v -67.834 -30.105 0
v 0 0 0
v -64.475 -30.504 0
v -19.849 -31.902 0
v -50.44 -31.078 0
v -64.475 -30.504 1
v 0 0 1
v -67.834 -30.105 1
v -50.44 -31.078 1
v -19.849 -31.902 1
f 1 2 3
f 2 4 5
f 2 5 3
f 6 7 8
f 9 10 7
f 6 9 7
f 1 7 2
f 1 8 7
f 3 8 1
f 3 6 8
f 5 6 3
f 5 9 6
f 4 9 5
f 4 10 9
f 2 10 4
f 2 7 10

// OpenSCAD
// Generated by SolidPython 1.1.3 on 2024-05-19 23:35:49


linear_extrude(height = 1) {
	polygon(points = [[0, 0], [-67.8343250000, -30.1046843750], [-67.7801375000, -30.1111265625], [-67.7259500000, -30.1175687500], [-67.6717625000, -30.1240109375], [-67.6175750000, -30.1304531250], [-67.5633875000, -30.1368953125], [-67.5092000000, -30.1433375000], [-67.4550125000, -30.1497796875], [-67.4008250000, -30.1562218750], [-67.3466375000, -30.1626640625], [-67.2924500000, -30.1691062500], [-67.2382625000, -30.1755484375], [-67.1840750000, -30.1819906250], [-67.1298875000, -30.1884328125], [-67.0757000000, -30.1948750000], [-67.0215125000, -30.2013171875], [-66.9673250000, -30.2077593750], [-66.9131375000, -30.2142015625], [-66.8589500000, -30.2206437500], [-66.8047625000, -30.2270859375], [-66.7505750000, -30.2335281250], [-66.6963875000, -30.2399703125], [-66.6422000000, -30.2464125000], [-66.5880125000, -30.2528546875], [-66.5338250000, -30.2592968750], [-66.4796375000, -30.2657390625], [-66.4254500000, -30.2721812500], [-66.3712625000, -30.2786234375], [-66.3170750000, -30.2850656250], [-66.2628875000, -30.2915078125], [-66.2087000000, -30.2979500000], [-66.1545125000, -30.3043921875], [-66.1003250000, -30.3108343750], [-66.0461375000, -30.3172765625], [-65.9919500000, -30.3237187500], [-65.9377625000, -30.3301609375], [-65.8835750000, -30.3366031250], [-65.8293875000, -30.3430453125], [-65.7752000000, -30.3494875000], [-65.7210125000, -30.3559296875], [-65.6668250000, -30.3623718750], [-65.6126375000, -30.3688140625], [-65.5584500000, -30.3752562500], [-65.5042625000, -30.3816984375], [-65.4500750000, -30.3881406250], [-65.3958875000, -30.3945828125], [-65.3417000000, -30.4010250000], [-65.2875125000, -30.4074671875], [-65.2333250000, -30.4139093750], [-65.1791375000, -30.4203515625], [-65.1249500000, -30.4267937500], [-65.0707625000, -30.4332359375], [-65.0165750000, -30.4396781250], [-64.9623875000, -30.4461203125], [-64.9082000000, -30.4525625000], [-64.8540125000, -30.4590046875], [-64.7998250000, -30.4654468750], [-64.7456375000, -30.4718890625], [-64.6914500000, -30.4783312500], [-64.6372625000, -30.4847734375], [-64.5830750000, -30.4912156250], [-64.5288875000, -30.4976578125], [-64.4747000000, -30.5041000000], [-64.3937843750, -30.5074093750], [-64.3128687500, -30.5107187500], [-64.2319531250, -30.5140281250], [-64.1510375000, -30.5173375000], [-64.0701218750, -30.5206468750], [-63.9892062500, -30.5239562500], [-63.9082906250, -30.5272656250], [-63.8273750000, -30.5305750000], [-63.7464593750, -30.5338843750], [-63.6655437500, -30.5371937500], [-63.5846281250, -30.5405031250], [-63.5037125000, -30.5438125000], [-63.4227968750, -30.5471218750], [-63.3418812500, -30.5504312500], [-63.2609656250, -30.5537406250], [-63.1800500000, -30.5570500000], [-63.0991343750, -30.5603593750], [-63.0182187500, -30.5636687500], [-62.9373031250, -30.5669781250], [-62.8563875000, -30.5702875000], [-62.7754718750, -30.5735968750], [-62.6945562500, -30.5769062500], [-62.6136406250, -30.5802156250], [-62.5327250000, -30.5835250000], [-62.4518093750, -30.5868343750], [-62.3708937500, -30.5901437500], [-62.2899781250, -30.5934531250], [-62.2090625000, -30.5967625000], [-62.1281468750, -30.6000718750], [-62.0472312500, -30.6033812500], [-61.9663156250, -30.6066906250], [-61.8854000000, -30.6100000000], [-61.7959828125, -30.6136570312], [-61.7065656250, -30.6173140625], [-61.6171484375, -30.6209710938], [-61.5277312500, -30.6246281250], [-61.4383140625, -30.6282851563], [-61.3488968750, -30.6319421875], [-61.2594796875, -30.6355992188], [-61.1700625000, -30.6392562500], [-61.0806453125, -30.6429132812], [-60.9912281250, -30.6465703125], [-60.9018109375, -30.6502273437], [-60.8123937500, -30.6538843750], [-60.7229765625, -30.6575414062], [-60.6335593750, -30.6611984375], [-60.5441421875, -30.6648554687], [-60.4547250000, -30.6685125000], [-60.3653078125, -30.6721695312], [-60.2758906250, -30.6758265625], [-60.1864734375, -30.6794835937], [-60.0970562500, -30.6831406250], [-60.0076390625, -30.6867976563], [-59.9182218750, -30.6904546875], [-59.8288046875, -30.6941117188], [-59.7393875000, -30.6977687500], [-59.6499703125, -30.7014257812], [-59.5605531250, -30.7050828125], [-59.4711359375, -30.7087398437], [-59.3817187500, -30.7123968750], [-59.2923015625, -30.7160539062], [-59.2028843750, -30.7197109375], [-59.1134671875, -30.7233679687], [-59.0240500000, -30.7270250000], [-58.9346328125, -30.7306820312], [-58.8452156250, -30.7343390625], [-58.7557984375, -30.7379960937], [-58.6663812500, -30.7416531250], [-58.5769640625, -30.7453101562], [-58.4875468750, -30.7489671875], [-58.3981296875, -30.7526242188], [-58.3087125000, -30.7562812500], [-58.2192953125, -30.7599382812], [-58.1298781250, -30.7635953125], [-58.0404609375, -30.7672523437], [-57.9510437500, -30.7709093750], [-57.8616265625, -30.7745664062], [-57.7722093750, -30.7782234375], [-57.6827921875, -30.7818804687], [-57.5933750000, -30.7855375000], [-57.5039578125, -30.7891945312], [-57.4145406250, -30.7928515625], [-57.3251234375, -30.7965085937], [-57.2357062500, -30.8001656250], [-57.1462890625, -30.8038226562], [-57.0568718750, -30.8074796875], [-56.9674546875, -30.8111367187], [-56.8780375000, -30.8147937500], [-56.7886203125, -30.8184507813], [-56.6992031250, -30.8221078125], [-56.6097859375, -30.8257648438], [-56.5203687500, -30.8294218750], [-56.4309515625, -30.8330789063], [-56.3415343750, -30.8367359375], [-56.2521171875, -30.8403929688], [-56.1627000000, -30.8440500000], [-56.0732828125, -30.8477070312], [-55.9838656250, -30.8513640625], [-55.8944484375, -30.8550210937], [-55.8050312500, -30.8586781250], [-55.7156140625, -30.8623351562], [-55.6261968750, -30.8659921875], [-55.5367796875, -30.8696492187], [-55.4473625000, -30.8733062500], [-55.3579453125, -30.8769632812], [-55.2685281250, -30.8806203125], [-55.1791109375, -30.8842773438], [-55.0896937500, -30.8879343750], [-55.0002765625, -30.8915914063], [-54.9108593750, -30.8952484375], [-54.8214421875, -30.8989054688], [-54.7320250000, -30.9025625000], [-54.6426078125, -30.9062195313], [-54.5531906250, -30.9098765625], [-54.4637734375, -30.9135335938], [-54.3743562500, -30.9171906250], [-54.2849390625, -30.9208476563], [-54.1955218750, -30.9245046875], [-54.1061046875, -30.9281617188], [-54.0166875000, -30.9318187500], [-53.9272703125, -30.9354757812], [-53.8378531250, -30.9391328125], [-53.7484359375, -30.9427898437], [-53.6590187500, -30.9464468750], [-53.5696015625, -30.9501039062], [-53.4801843750, -30.9537609375], [-53.3907671875, -30.9574179688], [-53.3013500000, -30.9610750000], [-53.2119328125, -30.9647320313], [-53.1225156250, -30.9683890625], [-53.0330984375, -30.9720460938], [-52.9436812500, -30.9757031250], [-52.8542640625, -30.9793601563], [-52.7648468750, -30.9830171875], [-52.6754296875, -30.9866742188], [-52.5860125000, -30.9903312500], [-52.4965953125, -30.9939882812], [-52.4071781250, -30.9976453125], [-52.3177609375, -31.0013023437], [-52.2283437500, -31.0049593750], [-52.1389265625, -31.0086164062], [-52.0495093750, -31.0122734375], [-51.9600921875, -31.0159304687], [-51.8706750000, -31.0195875000], [-51.7812578125, -31.0232445313], [-51.6918406250, -31.0269015625], [-51.6024234375, -31.0305585938], [-51.5130062500, -31.0342156250], [-51.4235890625, -31.0378726563], [-51.3341718750, -31.0415296875], [-51.2447546875, -31.0451867188], [-51.1553375000, -31.0488437500], [-51.0659203125, -31.0525007812], [-50.9765031250, -31.0561578125], [-50.8870859375, -31.0598148437], [-50.7976687500, -31.0634718750], [-50.7082515625, -31.0671289062], [-50.6188343750, -31.0707859375], [-50.5294171875, -31.0744429687], [-50.4400000000, -31.0781000000], [-50.3726199219, -31.0799140625], [-50.3052398438, -31.0817281250], [-50.2378597656, -31.0835421875], [-50.1704796875, -31.0853562500], [-50.1030996094, -31.0871703125], [-50.0357195312, -31.0889843750], [-49.9683394531, -31.0907984375], [-49.9009593750, -31.0926125000], [-49.8335792969, -31.0944265625], [-49.7661992188, -31.0962406250], [-49.6988191406, -31.0980546875], [-49.6314390625, -31.0998687500], [-49.5640589844, -31.1016828125], [-49.4966789062, -31.1034968750], [-49.4292988281, -31.1053109375], [-49.3619187500, -31.1071250000], [-49.2945386719, -31.1089390625], [-49.2271585938, -31.1107531250], [-49.1597785156, -31.1125671875], [-49.0923984375, -31.1143812500], [-49.0250183594, -31.1161953125], [-48.9576382812, -31.1180093750], [-48.8902582031, -31.1198234375], [-48.8228781250, -31.1216375000], [-48.7554980469, -31.1234515625], [-48.6881179687, -31.1252656250], [-48.6207378906, -31.1270796875], [-48.5533578125, -31.1288937500], [-48.4859777344, -31.1307078125], [-48.4185976563, -31.1325218750], [-48.3512175781, -31.1343359375], [-48.2838375000, -31.1361500000], [-48.2164574219, -31.1379640625], [-48.1490773437, -31.1397781250], [-48.0816972656, -31.1415921875], [-48.0143171875, -31.1434062500], [-47.9469371094, -31.1452203125], [-47.8795570312, -31.1470343750], [-47.8121769531, -31.1488484375], [-47.7447968750, -31.1506625000], [-47.6774167969, -31.1524765625], [-47.6100367187, -31.1542906250], [-47.5426566406, -31.1561046875], [-47.4752765625, -31.1579187500], [-47.4078964844, -31.1597328125], [-47.3405164062, -31.1615468750], [-47.2731363281, -31.1633609375], [-47.2057562500, -31.1651750000], [-47.1383761719, -31.1669890625], [-47.0709960937, -31.1688031250], [-47.0036160156, -31.1706171875], [-46.9362359375, -31.1724312500], [-46.8688558594, -31.1742453125], [-46.8014757812, -31.1760593750], [-46.7340957031, -31.1778734375], [-46.6667156250, -31.1796875000], [-46.5993355469, -31.1815015625], [-46.5319554687, -31.1833156250], [-46.4645753906, -31.1851296875], [-46.3971953125, -31.1869437500], [-46.3298152344, -31.1887578125], [-46.2624351562, -31.1905718750], [-46.1950550781, -31.1923859375], [-46.1276750000, -31.1942000000], [-46.0602949219, -31.1960140625], [-45.9929148438, -31.1978281250], [-45.9255347656, -31.1996421875], [-45.8581546875, -31.2014562500], [-45.7907746094, -31.2032703125], [-45.7233945312, -31.2050843750], [-45.6560144531, -31.2068984375], [-45.5886343750, -31.2087125000], [-45.5212542969, -31.2105265625], [-45.4538742188, -31.2123406250], [-45.3864941406, -31.2141546875], [-45.3191140625, -31.2159687500], [-45.2517339844, -31.2177828125], [-45.1843539062, -31.2195968750], [-45.1169738281, -31.2214109375], [-45.0495937500, -31.2232250000], [-44.9822136719, -31.2250390625], [-44.9148335938, -31.2268531250], [-44.8474535156, -31.2286671875], [-44.7800734375, -31.2304812500], [-44.7126933594, -31.2322953125], [-44.6453132812, -31.2341093750], [-44.5779332031, -31.2359234375], [-44.5105531250, -31.2377375000], [-44.4431730469, -31.2395515625], [-44.3757929687, -31.2413656250], [-44.3084128906, -31.2431796875], [-44.2410328125, -31.2449937500], [-44.1736527344, -31.2468078125], [-44.1062726562, -31.2486218750], [-44.0388925781, -31.2504359375], [-43.9715125000, -31.2522500000], [-43.9041324219, -31.2540640625], [-43.8367523437, -31.2558781250], [-43.7693722656, -31.2576921875], [-43.7019921875, -31.2595062500], [-43.6346121094, -31.2613203125], [-43.5672320312, -31.2631343750], [-43.4998519531, -31.2649484375], [-43.4324718750, -31.2667625000], [-43.3650917969, -31.2685765625], [-43.2977117187, -31.2703906250], [-43.2303316406, -31.2722046875], [-43.1629515625, -31.2740187500], [-43.0955714844, -31.2758328125], [-43.0281914062, -31.2776468750], [-42.9608113281, -31.2794609375], [-42.8934312500, -31.2812750000], [-42.8260511719, -31.2830890625], [-42.7586710937, -31.2849031250], [-42.6912910156, -31.2867171875], [-42.6239109375, -31.2885312500], [-42.5565308594, -31.2903453125], [-42.4891507812, -31.2921593750], [-42.4217707031, -31.2939734375], [-42.3543906250, -31.2957875000], [-42.2870105469, -31.2976015625], [-42.2196304687, -31.2994156250], [-42.1522503906, -31.3012296875], [-42.0848703125, -31.3030437500], [-42.0174902344, -31.3048578125], [-41.9501101562, -31.3066718750], [-41.8827300781, -31.3084859375], [-41.8153500000, -31.3103000000], [-41.7479699219, -31.3121140625], [-41.6805898437, -31.3139281250], [-41.6132097656, -31.3157421875], [-41.5458296875, -31.3175562500], [-41.4784496094, -31.3193703125], [-41.4110695312, -31.3211843750], [-41.3436894531, -31.3229984375], [-41.2763093750, -31.3248125000], [-41.2089292969, -31.3266265625], [-41.1415492188, -31.3284406250], [-41.0741691406, -31.3302546875], [-41.0067890625, -31.3320687500], [-40.9394089844, -31.3338828125], [-40.8720289062, -31.3356968750], [-40.8046488281, -31.3375109375], [-40.7372687500, -31.3393250000], [-40.6698886719, -31.3411390625], [-40.6025085938, -31.3429531250], [-40.5351285156, -31.3447671875], [-40.4677484375, -31.3465812500], [-40.4003683594, -31.3483953125], [-40.3329882812, -31.3502093750], [-40.2656082031, -31.3520234375], [-40.1982281250, -31.3538375000], [-40.1308480469, -31.3556515625], [-40.0634679687, -31.3574656250], [-39.9960878906, -31.3592796875], [-39.9287078125, -31.3610937500], [-39.8613277344, -31.3629078125], [-39.7939476562, -31.3647218750], [-39.7265675781, -31.3665359375], [-39.6591875000, -31.3683500000], [-39.5918074219, -31.3701640625], [-39.5244273437, -31.3719781250], [-39.4570472656, -31.3737921875], [-39.3896671875, -31.3756062500], [-39.3222871094, -31.3774203125], [-39.2549070312, -31.3792343750], [-39.1875269531, -31.3810484375], [-39.1201468750, -31.3828625000], [-39.0527667969, -31.3846765625], [-38.9853867187, -31.3864906250], [-38.9180066406, -31.3883046875], [-38.8506265625, -31.3901187500], [-38.7832464844, -31.3919328125], [-38.7158664062, -31.3937468750], [-38.6484863281, -31.3955609375], [-38.5811062500, -31.3973750000], [-38.5137261719, -31.3991890625], [-38.4463460937, -31.4010031250], [-38.3789660156, -31.4028171875], [-38.3115859375, -31.4046312500], [-38.2442058594, -31.4064453125], [-38.1768257812, -31.4082593750], [-38.1094457031, -31.4100734375], [-38.0420656250, -31.4118875000], [-37.9746855469, -31.4137015625], [-37.9073054687, -31.4155156250], [-37.8399253906, -31.4173296875], [-37.7725453125, -31.4191437500], [-37.7051652344, -31.4209578125], [-37.6377851562, -31.4227718750], [-37.5704050781, -31.4245859375], [-37.5030250000, -31.4264000000], [-37.4356449219, -31.4282140625], [-37.3682648437, -31.4300281250], [-37.3008847656, -31.4318421875], [-37.2335046875, -31.4336562500], [-37.1661246094, -31.4354703125], [-37.0987445312, -31.4372843750], [-37.0313644531, -31.4390984375], [-36.9639843750, -31.4409125000], [-36.8966042969, -31.4427265625], [-36.8292242187, -31.4445406250], [-36.7618441406, -31.4463546875], [-36.6944640625, -31.4481687500], [-36.6270839844, -31.4499828125], [-36.5597039062, -31.4517968750], [-36.4923238281, -31.4536109375], [-36.4249437500, -31.4554250000], [-36.3575636719, -31.4572390625], [-36.2901835938, -31.4590531250], [-36.2228035156, -31.4608671875], [-36.1554234375, -31.4626812500], [-36.0880433594, -31.4644953125], [-36.0206632812, -31.4663093750], [-35.9532832031, -31.4681234375], [-35.8859031250, -31.4699375000], [-35.8185230469, -31.4717515625], [-35.7511429688, -31.4735656250], [-35.6837628906, -31.4753796875], [-35.6163828125, -31.4771937500], [-35.5490027344, -31.4790078125], [-35.4816226562, -31.4808218750], [-35.4142425781, -31.4826359375], [-35.3468625000, -31.4844500000], [-35.2794824219, -31.4862640625], [-35.2121023438, -31.4880781250], [-35.1447222656, -31.4898921875], [-35.0773421875, -31.4917062500], [-35.0099621094, -31.4935203125], [-34.9425820312, -31.4953343750], [-34.8752019531, -31.4971484375], [-34.8078218750, -31.4989625000], [-34.7404417969, -31.5007765625], [-34.6730617188, -31.5025906250], [-34.6056816406, -31.5044046875], [-34.5383015625, -31.5062187500], [-34.4709214844, -31.5080328125], [-34.4035414062, -31.5098468750], [-34.3361613281, -31.5116609375], [-34.2687812500, -31.5134750000], [-34.2014011719, -31.5152890625], [-34.1340210938, -31.5171031250], [-34.0666410156, -31.5189171875], [-33.9992609375, -31.5207312500], [-33.9318808594, -31.5225453125], [-33.8645007813, -31.5243593750], [-33.7971207031, -31.5261734375], [-33.7297406250, -31.5279875000], [-33.6623605469, -31.5298015625], [-33.5949804688, -31.5316156250], [-33.5276003906, -31.5334296875], [-33.4602203125, -31.5352437500], [-33.3928402344, -31.5370578125], [-33.3254601563, -31.5388718750], [-33.2580800781, -31.5406859375], [-33.1907000000, -31.5425000000], [-33.1233199219, -31.5443140625], [-33.0559398437, -31.5461281250], [-32.9885597656, -31.5479421875], [-32.9211796875, -31.5497562500], [-32.8537996094, -31.5515703125], [-32.7864195312, -31.5533843750], [-32.7190394531, -31.5551984375], [-32.6516593750, -31.5570125000], [-32.5842792969, -31.5588265625], [-32.5168992187, -31.5606406250], [-32.4495191406, -31.5624546875], [-32.3821390625, -31.5642687500], [-32.3147589844, -31.5660828125], [-32.2473789062, -31.5678968750], [-32.1799988281, -31.5697109375], [-32.1126187500, -31.5715250000], [-32.0452386719, -31.5733390625], [-31.9778585937, -31.5751531250], [-31.9104785156, -31.5769671875], [-31.8430984375, -31.5787812500], [-31.7757183594, -31.5805953125], [-31.7083382812, -31.5824093750], [-31.6409582031, -31.5842234375], [-31.5735781250, -31.5860375000], [-31.5061980469, -31.5878515625], [-31.4388179687, -31.5896656250], [-31.3714378906, -31.5914796875], [-31.3040578125, -31.5932937500], [-31.2366777344, -31.5951078125], [-31.1692976562, -31.5969218750], [-31.1019175781, -31.5987359375], [-31.0345375000, -31.6005500000], [-30.9671574219, -31.6023640625], [-30.8997773437, -31.6041781250], [-30.8323972656, -31.6059921875], [-30.7650171875, -31.6078062500], [-30.6976371094, -31.6096203125], [-30.6302570313, -31.6114343750], [-30.5628769531, -31.6132484375], [-30.4954968750, -31.6150625000], [-30.4281167969, -31.6168765625], [-30.3607367188, -31.6186906250], [-30.2933566406, -31.6205046875], [-30.2259765625, -31.6223187500], [-30.1585964844, -31.6241328125], [-30.0912164062, -31.6259468750], [-30.0238363281, -31.6277609375], [-29.9564562500, -31.6295750000], [-29.8890761719, -31.6313890625], [-29.8216960937, -31.6332031250], [-29.7543160156, -31.6350171875], [-29.6869359375, -31.6368312500], [-29.6195558594, -31.6386453125], [-29.5521757812, -31.6404593750], [-29.4847957031, -31.6422734375], [-29.4174156250, -31.6440875000], [-29.3500355469, -31.6459015625], [-29.2826554687, -31.6477156250], [-29.2152753906, -31.6495296875], [-29.1478953125, -31.6513437500], [-29.0805152344, -31.6531578125], [-29.0131351562, -31.6549718750], [-28.9457550781, -31.6567859375], [-28.8783750000, -31.6586000000], [-28.8109949219, -31.6604140625], [-28.7436148437, -31.6622281250], [-28.6762347656, -31.6640421875], [-28.6088546875, -31.6658562500], [-28.5414746094, -31.6676703125], [-28.4740945312, -31.6694843750], [-28.4067144531, -31.6712984375], [-28.3393343750, -31.6731125000], [-28.2719542969, -31.6749265625], [-28.2045742188, -31.6767406250], [-28.1371941406, -31.6785546875], [-28.0698140625, -31.6803687500], [-28.0024339844, -31.6821828125], [-27.9350539062, -31.6839968750], [-27.8676738281, -31.6858109375], [-27.8002937500, -31.6876250000], [-27.7329136719, -31.6894390625], [-27.6655335937, -31.6912531250], [-27.5981535156, -31.6930671875], [-27.5307734375, -31.6948812500], [-27.4633933594, -31.6966953125], [-27.3960132812, -31.6985093750], [-27.3286332031, -31.7003234375], [-27.2612531250, -31.7021375000], [-27.1938730469, -31.7039515625], [-27.1264929687, -31.7057656250], [-27.0591128906, -31.7075796875], [-26.9917328125, -31.7093937500], [-26.9243527344, -31.7112078125], [-26.8569726562, -31.7130218750], [-26.7895925781, -31.7148359375], [-26.7222125000, -31.7166500000], [-26.6548324219, -31.7184640625], [-26.5874523437, -31.7202781250], [-26.5200722656, -31.7220921875], [-26.4526921875, -31.7239062500], [-26.3853121094, -31.7257203125], [-26.3179320312, -31.7275343750], [-26.2505519531, -31.7293484375], [-26.1831718750, -31.7311625000], [-26.1157917969, -31.7329765625], [-26.0484117187, -31.7347906250], [-25.9810316406, -31.7366046875], [-25.9136515625, -31.7384187500], [-25.8462714844, -31.7402328125], [-25.7788914063, -31.7420468750], [-25.7115113281, -31.7438609375], [-25.6441312500, -31.7456750000], [-25.5767511719, -31.7474890625], [-25.5093710938, -31.7493031250], [-25.4419910156, -31.7511171875], [-25.3746109375, -31.7529312500], [-25.3072308594, -31.7547453125], [-25.2398507813, -31.7565593750], [-25.1724707031, -31.7583734375], [-25.1050906250, -31.7601875000], [-25.0377105469, -31.7620015625], [-24.9703304688, -31.7638156250], [-24.9029503906, -31.7656296875], [-24.8355703125, -31.7674437500], [-24.7681902344, -31.7692578125], [-24.7008101563, -31.7710718750], [-24.6334300781, -31.7728859375], [-24.5660500000, -31.7747000000], [-24.4986699219, -31.7765140625], [-24.4312898438, -31.7783281250], [-24.3639097656, -31.7801421875], [-24.2965296875, -31.7819562500], [-24.2291496094, -31.7837703125], [-24.1617695312, -31.7855843750], [-24.0943894531, -31.7873984375], [-24.0270093750, -31.7892125000], [-23.9596292969, -31.7910265625], [-23.8922492187, -31.7928406250], [-23.8248691406, -31.7946546875], [-23.7574890625, -31.7964687500], [-23.6901089844, -31.7982828125], [-23.6227289062, -31.8000968750], [-23.5553488281, -31.8019109375], [-23.4879687500, -31.8037250000], [-23.4205886719, -31.8055390625], [-23.3532085938, -31.8073531250], [-23.2858285156, -31.8091671875], [-23.2184484375, -31.8109812500], [-23.1510683594, -31.8127953125], [-23.0836882813, -31.8146093750], [-23.0163082031, -31.8164234375], [-22.9489281250, -31.8182375000], [-22.8815480469, -31.8200515625], [-22.8141679688, -31.8218656250], [-22.7467878906, -31.8236796875], [-22.6794078125, -31.8254937500], [-22.6120277344, -31.8273078125], [-22.5446476562, -31.8291218750], [-22.4772675781, -31.8309359375], [-22.4098875000, -31.8327500000], [-22.3425074219, -31.8345640625], [-22.2751273438, -31.8363781250], [-22.2077472656, -31.8381921875], [-22.1403671875, -31.8400062500], [-22.0729871094, -31.8418203125], [-22.0056070312, -31.8436343750], [-21.9382269531, -31.8454484375], [-21.8708468750, -31.8472625000], [-21.8034667969, -31.8490765625], [-21.7360867187, -31.8508906250], [-21.6687066406, -31.8527046875], [-21.6013265625, -31.8545187500], [-21.5339464844, -31.8563328125], [-21.4665664062, -31.8581468750], [-21.3991863281, -31.8599609375], [-21.3318062500, -31.8617750000], [-21.2644261719, -31.8635890625], [-21.1970460938, -31.8654031250], [-21.1296660156, -31.8672171875], [-21.0622859375, -31.8690312500], [-20.9949058594, -31.8708453125], [-20.9275257813, -31.8726593750], [-20.8601457031, -31.8744734375], [-20.7927656250, -31.8762875000], [-20.7253855469, -31.8781015625], [-20.6580054688, -31.8799156250], [-20.5906253906, -31.8817296875], [-20.5232453125, -31.8835437500], [-20.4558652344, -31.8853578125], [-20.3884851562, -31.8871718750], [-20.3211050781, -31.8889859375], [-20.2537250000, -31.8908000000], [-20.1863449219, -31.8926140625], [-20.1189648437, -31.8944281250], [-20.0515847656, -31.8962421875], [-19.9842046875, -31.8980562500], [-19.9168246094, -31.8998703125], [-19.8494445312, -31.9016843750]]);
}
/***********************************************
*********      SolidPython code:      **********
************************************************
 
import math
import time

from stl import mesh, Dimension

from tkinter import Tk     # from tkinter import Tk for Python 3.x
from tkinter.filedialog import askopenfilename
from mpl_toolkits.mplot3d import art3d
from matplotlib import pyplot as plt
import solid
import os
import ezdxf
import shapely.geometry as sg
import subprocess
from GUI import getSCADPath



def outputSTL(From, To, PATH=getSCADPath()):
    subprocess.Popen(PATH + " -o " + To + " " + From)
    while not os.path.exists(To):
        time.sleep(1)


def get_size(i):
    x_list = [int(a) for a in str(i)]
    return len(x_list)



class Model:
    def __init__(self, model, fileName, location, layer, thickness):
        self.location = location
        self.code = None
        self.fileName = fileName
        self.stl = fileName + ".stl"
        self.layer = layer
        self.thickness = thickness
        self.maxz = (layer+1)*thickness
        self.dxf = fileName + ".dxf"
        self.scad = fileName + ".scad"
        self.model = model
        self.center = None
        self.width = 10
        self.mesh = None
        self.useable_area = None


    def get_code(self):
        max_dim = 0.05
        max_array = 6

        num = int(self.fileName)
        nums = [int(a) for a in str(num)]
        nums.reverse()
        indices = nums
        length = len(nums)

        print(indices)
        t = 0
        i = 0
        cubes = []
        x = 0
        y = 0
        width = 0.01
        while x <= max_dim:
            while y <= max_dim:
                print(indices)
                if nums == []:
                    break
                if indices[0] != 0:
                    cubes.append(solid.translate([x, y, 0])(solid.cube(size=t / 1000 + 0.001)))
                    y += max_dim / (max_array - 1)
                    nums[0] = nums[0] - 1
                else:
                    indices.pop(0)
                    t += 1
                i += 1
            x += max_dim / (max_array - 1)
            y = 0

        outside = solid.translate([-width / 2, -width / 2])(solid.cube(max_dim + (length - 1) / 1000 + 0.001 + width))
        self.code = solid.difference()(outside, cubes)
        self.code = solid.projection(cut=True)(self.code)
        solid.scad_render_to_file(self.code, self.location + "/code.scad")
        outputSTL(From=self.location+"/code.scad", To=self.location+"code.dxf", PATH=getSCADPath())
        # os.system("toSTL.sh renders/code.scad renders/code.dxf")
        return self.location+"/code.dxf"

    def download(self, type):
        if type =="stl":
            print("generating:" + self.location+"/"+ self.fileName+".stl")
            outputSTL(From=self.location+"/"+self.fileName+".scad", To=self.location+"/"+self.fileName+".stl")
            # os.system("toSTL.sh renders/"+ self.fileName+".scad renders/"+ self.fileName+".stl")
        elif type == "dxf":
            outputSTL(From=self.location+"/"+self.fileName+".scad", To=self.location+"/"+self.fileName+".dxf")
            # os.system("toSTL.sh renders/"+ self.fileName+".scad renders/"+ self.fileName+".dxf")

    def render(self):
        solid.scad_render_to_file(self.model, self.location+"/"+ self.fileName+'.scad')
        while not os.path.exists(self.location+"/"+self.fileName+".scad"):
            time.sleep(1)

    def get_points(self):
        doc = ezdxf.readfile(filename=self.location+"/"+ self.fileName+".dxf")
        msp = doc.modelspace()
        i=0
        lists = []
        def helper(e):
            start = [e.dxf.start[0], e.dxf.start[1]]
            end = [e.dxf.end[0], e.dxf.end[1]]
            return [start, end]

        for e in msp.query("LINE"):
            line = helper(e)
            if not lists:
                lists.append([line])
            else:
                if lists[i][len(lists)-1][1] != line[0]:
                    lists.append([line])
                    i+=1
                else:
                    lists[i].append(line)

    def get_points2(self, FILE):
        doc = ezdxf.readfile(filename=FILE)
        msp = doc.modelspace()
        i = 0
        lists = []

        def helper(e):
            start = [e.dxf.start[0], e.dxf.start[1]]
            end = [e.dxf.end[0], e.dxf.end[1]]
            return (start, end)

        for e in msp.query("LINE"):
            line = helper(e)
            if lists==[]:
                lists.append([line])
            else:
                if lists[i][len(lists[i]) - 1][1] != line[0]:
                    lists.append([line])
                    i += 1
                else:
                    lists[i].append(line)
        return lists

    def add_code(self):
        dxf = solid.projection(cut=False)(self.model)
        offset = solid.offset(r=-0.1)(dxf)
        solid.scad_render_to_file(offset, self.location+'/offset.scad')
        os.system("toSTL.sh renders/offset.scad renders/offset.dxf")
        lines = self.get_points2("renders/offset.dxf")
        x = lines[0][0][0][0]
        y = lines[0][0][0][1]
        print(x)
        print(y)
        code = solid.translate([x,y,0])(self.code)
        code = solid.linear_extrude(height=999)(code)
        save = self.model
        self.model = solid.projection()(solid.difference()(self.model, code))
        self.render()
        self.download("dxf")
        self.model = save

    def add_label(self, pos):
        # num = 12
        # minx, maxx, miny, maxy, minz, maxz = self.find_minmax()
        maxz = self.maxz
        # label = solid.linear_extrude(height=(maxz-minz)/3)(solid.text(str(self.fileName), size=0.5, halign="center"))
        # i=minx
        # print("x-len: " + str(maxx-minx))
        # print(i)
        # inc = (maxx-minx)/num
        # while minx <= i <= maxx:
        #     label = solid.union()(solid.translate([i, 0, maxz - 0.2])(solid.linear_extrude(height=(maxz-minz)/3)(solid.text(str(self.fileName), size=0.25, halign="center"))), label)
        #     i += inc
        #
        # l = label
        #
        # i =miny
        # while miny<= i <= maxy:
        #     print("y inc")
        #     l = solid.union()(solid.translate([0, i, 0])(label), l)
        #     i += 0.5
        for i in str(self.fileName):
            cur = pos[0]
            label = solid.translate([pos[0][0], pos[0][1], self.maxz-0.2])(solid.linear_extrude(height=(self.thickness)/3)(solid.text(str(i), size=0.5, halign="center", valign="center")))
            self.model = solid.difference()(self.model, label)
            pos.append(pos.pop(0))
            while abs(cur[0]-pos[0][0])<0.5 and abs(cur[1]-pos[0][1])<0.5:
                pos.append(pos.pop(0))



    def Center(self):

        volume, cog, inertia = self.mesh.get_mass_properties()
        print("Volume                                  = {0}".format(volume))
        print("Position of the center of gravity (COG) = {0}".format(cog))
        m_centered = solid.translate([-cog[0], -cog[1], 0])(
            self.model
        )
        return m_centered

    def find_minmax(self):
        minx = maxx = miny = maxy = minz = maxz = None
        for p in self.mesh.points:
            # p contains (x, y, z)
            if minx is None:
                minx = p[Dimension.X]
                maxx = p[Dimension.X]
                miny = p[Dimension.Y]
                maxy = p[Dimension.Y]
                minz = p[Dimension.Z]
                maxz = p[Dimension.Z]
            else:
                maxx = max(p[Dimension.X], maxx)
                minx = min(p[Dimension.X], minx)
                maxy = max(p[Dimension.Y], maxy)
                miny = min(p[Dimension.Y], miny)
                maxz = max(p[Dimension.Z], maxz)
                minz = min(p[Dimension.Z], minz)
        lenx = maxx - minx
        leny = maxy - miny
        lenz = maxz - minz
        return minx, maxx, miny, maxy, minz, maxz

    # def generate_Mesh(self):
    #     self.mesh = mesh.Mesh.from_file(self.location + "/" + str(int(self.fileName)//8)+ "b.stl")

    def get_top(self):
        top = solid.projection(cut=True)(solid.translate([0,0,-1*self.thickness*(self.layer+1)])(self.model))
        useable_area = solid.offset(r=-0.45)(top)
        self.useable_area = useable_area
        solid.scad_render_to_file(self.useable_area, self.location+'/' + 'toptemp.scad')
        outputSTL(From=self.location+'/' + 'toptemp.scad', To=self.location+"/top"+ self.dxf)

        # os.system("toSTL.sh out/toptemp.scad renders/" + self.fileName + ".dxf")
        dxf = DXF(self.location+"/top"+ self.dxf)
        min_p=dxf.points[0][0]
        points_ordered = dxf.points
        i=0
        while i <= len(dxf.points)+1:
            while math.sqrt((dxf.points[0][0]-dxf.points[1][0])**2+(dxf.points[0][1]-dxf.points[1][1])**2) > 0.1:
                dxf.points.insert(1, [(dxf.points[0][0]+dxf.points[1][0])/2, (dxf.points[0][1]+dxf.points[1][1])/2])
                i = i-1
            dxf.points.append(dxf.points.pop(0))
            i+=1
        for i in range(len(dxf.points)):
            dxf.points.append(dxf.points.pop(0))
            if dxf.points[0][0] < min_p:
                min_p = dxf.points[0][0]
                points_ordered = dxf.points.copy()
        dxf.points = points_ordered.copy()

        print(dxf.points)
        self.add_label(dxf.points)

class DXF:
    def __init__(self, file):
        self.file = file
        self.Lines = []
        self.points = []
        doc = ezdxf.readfile(self.file)
        msp = doc.modelspace()
        for e in msp:
            if e.dxftype() == "LINE":
                self.Lines.append(e)
                self.points.append([e.dxf.start[0], e.dxf.start[1]])
        # self.points.append([self.Lines[-1].dxf.end[0], self.Lines[-1].dxf.end[1]])
        self.area = None
        self.center = None
        self.polygon = sg.Polygon(self.points)

    def get_area(self):
        self.area = self.polygon.area
        return self.area

    def get_center(self):
        x_sum = 0
        y_sum =0
        for i in self.points:
            x_sum += i[0]
            y_sum += i[1]
        x_c = x_sum/len(self.points)
        y_c = y_sum/len(self.points)
        return (x_c, y_c)

    def split(self, maxdim):
        splits = []
        length = 0
        pieces = [[]]
        prev = self.points[0]
        for j in self.points:
            length = length + math.sqrt((prev[0]-j[0])**2+(prev[1]-j[1])**2)
            if length >= maxdim:
                pieces[-1].append(j)
                pieces.append([])
                length = 0
            pieces[-1].append(j)
            prev = j
        for j in pieces:
            j.insert(0, [0,0])
            piece = solid.linear_extrude(height=1)(solid.polygon(j))
            splits.append(piece)
        return splits
    def refine_points(self):
        i=0
        while i <= len(self.points)+1:
            while math.sqrt((self.points[0][0]-self.points[1][0])**2+(self.points[0][1]-self.points[1][1])**2) > 0.1:
                self.points.insert(1, [(self.points[0][0]+self.points[1][0])/2, (self.points[0][1]+self.points[1][1])/2])
                i = i-1
            self.points.append(self.points.pop(0))
            i+=1


if __name__== "__main__":
    test = DXF("C:/Users/Daniel/Documents/repos/Shell_Maker/output/0top_slice.dxf")
    test.refine_points()
    k = test.split(48)
    for i in range(len(k)):
        solid.scad_render_to_file(k[i], str(i) + ".scad")


 
 
************************************************/
